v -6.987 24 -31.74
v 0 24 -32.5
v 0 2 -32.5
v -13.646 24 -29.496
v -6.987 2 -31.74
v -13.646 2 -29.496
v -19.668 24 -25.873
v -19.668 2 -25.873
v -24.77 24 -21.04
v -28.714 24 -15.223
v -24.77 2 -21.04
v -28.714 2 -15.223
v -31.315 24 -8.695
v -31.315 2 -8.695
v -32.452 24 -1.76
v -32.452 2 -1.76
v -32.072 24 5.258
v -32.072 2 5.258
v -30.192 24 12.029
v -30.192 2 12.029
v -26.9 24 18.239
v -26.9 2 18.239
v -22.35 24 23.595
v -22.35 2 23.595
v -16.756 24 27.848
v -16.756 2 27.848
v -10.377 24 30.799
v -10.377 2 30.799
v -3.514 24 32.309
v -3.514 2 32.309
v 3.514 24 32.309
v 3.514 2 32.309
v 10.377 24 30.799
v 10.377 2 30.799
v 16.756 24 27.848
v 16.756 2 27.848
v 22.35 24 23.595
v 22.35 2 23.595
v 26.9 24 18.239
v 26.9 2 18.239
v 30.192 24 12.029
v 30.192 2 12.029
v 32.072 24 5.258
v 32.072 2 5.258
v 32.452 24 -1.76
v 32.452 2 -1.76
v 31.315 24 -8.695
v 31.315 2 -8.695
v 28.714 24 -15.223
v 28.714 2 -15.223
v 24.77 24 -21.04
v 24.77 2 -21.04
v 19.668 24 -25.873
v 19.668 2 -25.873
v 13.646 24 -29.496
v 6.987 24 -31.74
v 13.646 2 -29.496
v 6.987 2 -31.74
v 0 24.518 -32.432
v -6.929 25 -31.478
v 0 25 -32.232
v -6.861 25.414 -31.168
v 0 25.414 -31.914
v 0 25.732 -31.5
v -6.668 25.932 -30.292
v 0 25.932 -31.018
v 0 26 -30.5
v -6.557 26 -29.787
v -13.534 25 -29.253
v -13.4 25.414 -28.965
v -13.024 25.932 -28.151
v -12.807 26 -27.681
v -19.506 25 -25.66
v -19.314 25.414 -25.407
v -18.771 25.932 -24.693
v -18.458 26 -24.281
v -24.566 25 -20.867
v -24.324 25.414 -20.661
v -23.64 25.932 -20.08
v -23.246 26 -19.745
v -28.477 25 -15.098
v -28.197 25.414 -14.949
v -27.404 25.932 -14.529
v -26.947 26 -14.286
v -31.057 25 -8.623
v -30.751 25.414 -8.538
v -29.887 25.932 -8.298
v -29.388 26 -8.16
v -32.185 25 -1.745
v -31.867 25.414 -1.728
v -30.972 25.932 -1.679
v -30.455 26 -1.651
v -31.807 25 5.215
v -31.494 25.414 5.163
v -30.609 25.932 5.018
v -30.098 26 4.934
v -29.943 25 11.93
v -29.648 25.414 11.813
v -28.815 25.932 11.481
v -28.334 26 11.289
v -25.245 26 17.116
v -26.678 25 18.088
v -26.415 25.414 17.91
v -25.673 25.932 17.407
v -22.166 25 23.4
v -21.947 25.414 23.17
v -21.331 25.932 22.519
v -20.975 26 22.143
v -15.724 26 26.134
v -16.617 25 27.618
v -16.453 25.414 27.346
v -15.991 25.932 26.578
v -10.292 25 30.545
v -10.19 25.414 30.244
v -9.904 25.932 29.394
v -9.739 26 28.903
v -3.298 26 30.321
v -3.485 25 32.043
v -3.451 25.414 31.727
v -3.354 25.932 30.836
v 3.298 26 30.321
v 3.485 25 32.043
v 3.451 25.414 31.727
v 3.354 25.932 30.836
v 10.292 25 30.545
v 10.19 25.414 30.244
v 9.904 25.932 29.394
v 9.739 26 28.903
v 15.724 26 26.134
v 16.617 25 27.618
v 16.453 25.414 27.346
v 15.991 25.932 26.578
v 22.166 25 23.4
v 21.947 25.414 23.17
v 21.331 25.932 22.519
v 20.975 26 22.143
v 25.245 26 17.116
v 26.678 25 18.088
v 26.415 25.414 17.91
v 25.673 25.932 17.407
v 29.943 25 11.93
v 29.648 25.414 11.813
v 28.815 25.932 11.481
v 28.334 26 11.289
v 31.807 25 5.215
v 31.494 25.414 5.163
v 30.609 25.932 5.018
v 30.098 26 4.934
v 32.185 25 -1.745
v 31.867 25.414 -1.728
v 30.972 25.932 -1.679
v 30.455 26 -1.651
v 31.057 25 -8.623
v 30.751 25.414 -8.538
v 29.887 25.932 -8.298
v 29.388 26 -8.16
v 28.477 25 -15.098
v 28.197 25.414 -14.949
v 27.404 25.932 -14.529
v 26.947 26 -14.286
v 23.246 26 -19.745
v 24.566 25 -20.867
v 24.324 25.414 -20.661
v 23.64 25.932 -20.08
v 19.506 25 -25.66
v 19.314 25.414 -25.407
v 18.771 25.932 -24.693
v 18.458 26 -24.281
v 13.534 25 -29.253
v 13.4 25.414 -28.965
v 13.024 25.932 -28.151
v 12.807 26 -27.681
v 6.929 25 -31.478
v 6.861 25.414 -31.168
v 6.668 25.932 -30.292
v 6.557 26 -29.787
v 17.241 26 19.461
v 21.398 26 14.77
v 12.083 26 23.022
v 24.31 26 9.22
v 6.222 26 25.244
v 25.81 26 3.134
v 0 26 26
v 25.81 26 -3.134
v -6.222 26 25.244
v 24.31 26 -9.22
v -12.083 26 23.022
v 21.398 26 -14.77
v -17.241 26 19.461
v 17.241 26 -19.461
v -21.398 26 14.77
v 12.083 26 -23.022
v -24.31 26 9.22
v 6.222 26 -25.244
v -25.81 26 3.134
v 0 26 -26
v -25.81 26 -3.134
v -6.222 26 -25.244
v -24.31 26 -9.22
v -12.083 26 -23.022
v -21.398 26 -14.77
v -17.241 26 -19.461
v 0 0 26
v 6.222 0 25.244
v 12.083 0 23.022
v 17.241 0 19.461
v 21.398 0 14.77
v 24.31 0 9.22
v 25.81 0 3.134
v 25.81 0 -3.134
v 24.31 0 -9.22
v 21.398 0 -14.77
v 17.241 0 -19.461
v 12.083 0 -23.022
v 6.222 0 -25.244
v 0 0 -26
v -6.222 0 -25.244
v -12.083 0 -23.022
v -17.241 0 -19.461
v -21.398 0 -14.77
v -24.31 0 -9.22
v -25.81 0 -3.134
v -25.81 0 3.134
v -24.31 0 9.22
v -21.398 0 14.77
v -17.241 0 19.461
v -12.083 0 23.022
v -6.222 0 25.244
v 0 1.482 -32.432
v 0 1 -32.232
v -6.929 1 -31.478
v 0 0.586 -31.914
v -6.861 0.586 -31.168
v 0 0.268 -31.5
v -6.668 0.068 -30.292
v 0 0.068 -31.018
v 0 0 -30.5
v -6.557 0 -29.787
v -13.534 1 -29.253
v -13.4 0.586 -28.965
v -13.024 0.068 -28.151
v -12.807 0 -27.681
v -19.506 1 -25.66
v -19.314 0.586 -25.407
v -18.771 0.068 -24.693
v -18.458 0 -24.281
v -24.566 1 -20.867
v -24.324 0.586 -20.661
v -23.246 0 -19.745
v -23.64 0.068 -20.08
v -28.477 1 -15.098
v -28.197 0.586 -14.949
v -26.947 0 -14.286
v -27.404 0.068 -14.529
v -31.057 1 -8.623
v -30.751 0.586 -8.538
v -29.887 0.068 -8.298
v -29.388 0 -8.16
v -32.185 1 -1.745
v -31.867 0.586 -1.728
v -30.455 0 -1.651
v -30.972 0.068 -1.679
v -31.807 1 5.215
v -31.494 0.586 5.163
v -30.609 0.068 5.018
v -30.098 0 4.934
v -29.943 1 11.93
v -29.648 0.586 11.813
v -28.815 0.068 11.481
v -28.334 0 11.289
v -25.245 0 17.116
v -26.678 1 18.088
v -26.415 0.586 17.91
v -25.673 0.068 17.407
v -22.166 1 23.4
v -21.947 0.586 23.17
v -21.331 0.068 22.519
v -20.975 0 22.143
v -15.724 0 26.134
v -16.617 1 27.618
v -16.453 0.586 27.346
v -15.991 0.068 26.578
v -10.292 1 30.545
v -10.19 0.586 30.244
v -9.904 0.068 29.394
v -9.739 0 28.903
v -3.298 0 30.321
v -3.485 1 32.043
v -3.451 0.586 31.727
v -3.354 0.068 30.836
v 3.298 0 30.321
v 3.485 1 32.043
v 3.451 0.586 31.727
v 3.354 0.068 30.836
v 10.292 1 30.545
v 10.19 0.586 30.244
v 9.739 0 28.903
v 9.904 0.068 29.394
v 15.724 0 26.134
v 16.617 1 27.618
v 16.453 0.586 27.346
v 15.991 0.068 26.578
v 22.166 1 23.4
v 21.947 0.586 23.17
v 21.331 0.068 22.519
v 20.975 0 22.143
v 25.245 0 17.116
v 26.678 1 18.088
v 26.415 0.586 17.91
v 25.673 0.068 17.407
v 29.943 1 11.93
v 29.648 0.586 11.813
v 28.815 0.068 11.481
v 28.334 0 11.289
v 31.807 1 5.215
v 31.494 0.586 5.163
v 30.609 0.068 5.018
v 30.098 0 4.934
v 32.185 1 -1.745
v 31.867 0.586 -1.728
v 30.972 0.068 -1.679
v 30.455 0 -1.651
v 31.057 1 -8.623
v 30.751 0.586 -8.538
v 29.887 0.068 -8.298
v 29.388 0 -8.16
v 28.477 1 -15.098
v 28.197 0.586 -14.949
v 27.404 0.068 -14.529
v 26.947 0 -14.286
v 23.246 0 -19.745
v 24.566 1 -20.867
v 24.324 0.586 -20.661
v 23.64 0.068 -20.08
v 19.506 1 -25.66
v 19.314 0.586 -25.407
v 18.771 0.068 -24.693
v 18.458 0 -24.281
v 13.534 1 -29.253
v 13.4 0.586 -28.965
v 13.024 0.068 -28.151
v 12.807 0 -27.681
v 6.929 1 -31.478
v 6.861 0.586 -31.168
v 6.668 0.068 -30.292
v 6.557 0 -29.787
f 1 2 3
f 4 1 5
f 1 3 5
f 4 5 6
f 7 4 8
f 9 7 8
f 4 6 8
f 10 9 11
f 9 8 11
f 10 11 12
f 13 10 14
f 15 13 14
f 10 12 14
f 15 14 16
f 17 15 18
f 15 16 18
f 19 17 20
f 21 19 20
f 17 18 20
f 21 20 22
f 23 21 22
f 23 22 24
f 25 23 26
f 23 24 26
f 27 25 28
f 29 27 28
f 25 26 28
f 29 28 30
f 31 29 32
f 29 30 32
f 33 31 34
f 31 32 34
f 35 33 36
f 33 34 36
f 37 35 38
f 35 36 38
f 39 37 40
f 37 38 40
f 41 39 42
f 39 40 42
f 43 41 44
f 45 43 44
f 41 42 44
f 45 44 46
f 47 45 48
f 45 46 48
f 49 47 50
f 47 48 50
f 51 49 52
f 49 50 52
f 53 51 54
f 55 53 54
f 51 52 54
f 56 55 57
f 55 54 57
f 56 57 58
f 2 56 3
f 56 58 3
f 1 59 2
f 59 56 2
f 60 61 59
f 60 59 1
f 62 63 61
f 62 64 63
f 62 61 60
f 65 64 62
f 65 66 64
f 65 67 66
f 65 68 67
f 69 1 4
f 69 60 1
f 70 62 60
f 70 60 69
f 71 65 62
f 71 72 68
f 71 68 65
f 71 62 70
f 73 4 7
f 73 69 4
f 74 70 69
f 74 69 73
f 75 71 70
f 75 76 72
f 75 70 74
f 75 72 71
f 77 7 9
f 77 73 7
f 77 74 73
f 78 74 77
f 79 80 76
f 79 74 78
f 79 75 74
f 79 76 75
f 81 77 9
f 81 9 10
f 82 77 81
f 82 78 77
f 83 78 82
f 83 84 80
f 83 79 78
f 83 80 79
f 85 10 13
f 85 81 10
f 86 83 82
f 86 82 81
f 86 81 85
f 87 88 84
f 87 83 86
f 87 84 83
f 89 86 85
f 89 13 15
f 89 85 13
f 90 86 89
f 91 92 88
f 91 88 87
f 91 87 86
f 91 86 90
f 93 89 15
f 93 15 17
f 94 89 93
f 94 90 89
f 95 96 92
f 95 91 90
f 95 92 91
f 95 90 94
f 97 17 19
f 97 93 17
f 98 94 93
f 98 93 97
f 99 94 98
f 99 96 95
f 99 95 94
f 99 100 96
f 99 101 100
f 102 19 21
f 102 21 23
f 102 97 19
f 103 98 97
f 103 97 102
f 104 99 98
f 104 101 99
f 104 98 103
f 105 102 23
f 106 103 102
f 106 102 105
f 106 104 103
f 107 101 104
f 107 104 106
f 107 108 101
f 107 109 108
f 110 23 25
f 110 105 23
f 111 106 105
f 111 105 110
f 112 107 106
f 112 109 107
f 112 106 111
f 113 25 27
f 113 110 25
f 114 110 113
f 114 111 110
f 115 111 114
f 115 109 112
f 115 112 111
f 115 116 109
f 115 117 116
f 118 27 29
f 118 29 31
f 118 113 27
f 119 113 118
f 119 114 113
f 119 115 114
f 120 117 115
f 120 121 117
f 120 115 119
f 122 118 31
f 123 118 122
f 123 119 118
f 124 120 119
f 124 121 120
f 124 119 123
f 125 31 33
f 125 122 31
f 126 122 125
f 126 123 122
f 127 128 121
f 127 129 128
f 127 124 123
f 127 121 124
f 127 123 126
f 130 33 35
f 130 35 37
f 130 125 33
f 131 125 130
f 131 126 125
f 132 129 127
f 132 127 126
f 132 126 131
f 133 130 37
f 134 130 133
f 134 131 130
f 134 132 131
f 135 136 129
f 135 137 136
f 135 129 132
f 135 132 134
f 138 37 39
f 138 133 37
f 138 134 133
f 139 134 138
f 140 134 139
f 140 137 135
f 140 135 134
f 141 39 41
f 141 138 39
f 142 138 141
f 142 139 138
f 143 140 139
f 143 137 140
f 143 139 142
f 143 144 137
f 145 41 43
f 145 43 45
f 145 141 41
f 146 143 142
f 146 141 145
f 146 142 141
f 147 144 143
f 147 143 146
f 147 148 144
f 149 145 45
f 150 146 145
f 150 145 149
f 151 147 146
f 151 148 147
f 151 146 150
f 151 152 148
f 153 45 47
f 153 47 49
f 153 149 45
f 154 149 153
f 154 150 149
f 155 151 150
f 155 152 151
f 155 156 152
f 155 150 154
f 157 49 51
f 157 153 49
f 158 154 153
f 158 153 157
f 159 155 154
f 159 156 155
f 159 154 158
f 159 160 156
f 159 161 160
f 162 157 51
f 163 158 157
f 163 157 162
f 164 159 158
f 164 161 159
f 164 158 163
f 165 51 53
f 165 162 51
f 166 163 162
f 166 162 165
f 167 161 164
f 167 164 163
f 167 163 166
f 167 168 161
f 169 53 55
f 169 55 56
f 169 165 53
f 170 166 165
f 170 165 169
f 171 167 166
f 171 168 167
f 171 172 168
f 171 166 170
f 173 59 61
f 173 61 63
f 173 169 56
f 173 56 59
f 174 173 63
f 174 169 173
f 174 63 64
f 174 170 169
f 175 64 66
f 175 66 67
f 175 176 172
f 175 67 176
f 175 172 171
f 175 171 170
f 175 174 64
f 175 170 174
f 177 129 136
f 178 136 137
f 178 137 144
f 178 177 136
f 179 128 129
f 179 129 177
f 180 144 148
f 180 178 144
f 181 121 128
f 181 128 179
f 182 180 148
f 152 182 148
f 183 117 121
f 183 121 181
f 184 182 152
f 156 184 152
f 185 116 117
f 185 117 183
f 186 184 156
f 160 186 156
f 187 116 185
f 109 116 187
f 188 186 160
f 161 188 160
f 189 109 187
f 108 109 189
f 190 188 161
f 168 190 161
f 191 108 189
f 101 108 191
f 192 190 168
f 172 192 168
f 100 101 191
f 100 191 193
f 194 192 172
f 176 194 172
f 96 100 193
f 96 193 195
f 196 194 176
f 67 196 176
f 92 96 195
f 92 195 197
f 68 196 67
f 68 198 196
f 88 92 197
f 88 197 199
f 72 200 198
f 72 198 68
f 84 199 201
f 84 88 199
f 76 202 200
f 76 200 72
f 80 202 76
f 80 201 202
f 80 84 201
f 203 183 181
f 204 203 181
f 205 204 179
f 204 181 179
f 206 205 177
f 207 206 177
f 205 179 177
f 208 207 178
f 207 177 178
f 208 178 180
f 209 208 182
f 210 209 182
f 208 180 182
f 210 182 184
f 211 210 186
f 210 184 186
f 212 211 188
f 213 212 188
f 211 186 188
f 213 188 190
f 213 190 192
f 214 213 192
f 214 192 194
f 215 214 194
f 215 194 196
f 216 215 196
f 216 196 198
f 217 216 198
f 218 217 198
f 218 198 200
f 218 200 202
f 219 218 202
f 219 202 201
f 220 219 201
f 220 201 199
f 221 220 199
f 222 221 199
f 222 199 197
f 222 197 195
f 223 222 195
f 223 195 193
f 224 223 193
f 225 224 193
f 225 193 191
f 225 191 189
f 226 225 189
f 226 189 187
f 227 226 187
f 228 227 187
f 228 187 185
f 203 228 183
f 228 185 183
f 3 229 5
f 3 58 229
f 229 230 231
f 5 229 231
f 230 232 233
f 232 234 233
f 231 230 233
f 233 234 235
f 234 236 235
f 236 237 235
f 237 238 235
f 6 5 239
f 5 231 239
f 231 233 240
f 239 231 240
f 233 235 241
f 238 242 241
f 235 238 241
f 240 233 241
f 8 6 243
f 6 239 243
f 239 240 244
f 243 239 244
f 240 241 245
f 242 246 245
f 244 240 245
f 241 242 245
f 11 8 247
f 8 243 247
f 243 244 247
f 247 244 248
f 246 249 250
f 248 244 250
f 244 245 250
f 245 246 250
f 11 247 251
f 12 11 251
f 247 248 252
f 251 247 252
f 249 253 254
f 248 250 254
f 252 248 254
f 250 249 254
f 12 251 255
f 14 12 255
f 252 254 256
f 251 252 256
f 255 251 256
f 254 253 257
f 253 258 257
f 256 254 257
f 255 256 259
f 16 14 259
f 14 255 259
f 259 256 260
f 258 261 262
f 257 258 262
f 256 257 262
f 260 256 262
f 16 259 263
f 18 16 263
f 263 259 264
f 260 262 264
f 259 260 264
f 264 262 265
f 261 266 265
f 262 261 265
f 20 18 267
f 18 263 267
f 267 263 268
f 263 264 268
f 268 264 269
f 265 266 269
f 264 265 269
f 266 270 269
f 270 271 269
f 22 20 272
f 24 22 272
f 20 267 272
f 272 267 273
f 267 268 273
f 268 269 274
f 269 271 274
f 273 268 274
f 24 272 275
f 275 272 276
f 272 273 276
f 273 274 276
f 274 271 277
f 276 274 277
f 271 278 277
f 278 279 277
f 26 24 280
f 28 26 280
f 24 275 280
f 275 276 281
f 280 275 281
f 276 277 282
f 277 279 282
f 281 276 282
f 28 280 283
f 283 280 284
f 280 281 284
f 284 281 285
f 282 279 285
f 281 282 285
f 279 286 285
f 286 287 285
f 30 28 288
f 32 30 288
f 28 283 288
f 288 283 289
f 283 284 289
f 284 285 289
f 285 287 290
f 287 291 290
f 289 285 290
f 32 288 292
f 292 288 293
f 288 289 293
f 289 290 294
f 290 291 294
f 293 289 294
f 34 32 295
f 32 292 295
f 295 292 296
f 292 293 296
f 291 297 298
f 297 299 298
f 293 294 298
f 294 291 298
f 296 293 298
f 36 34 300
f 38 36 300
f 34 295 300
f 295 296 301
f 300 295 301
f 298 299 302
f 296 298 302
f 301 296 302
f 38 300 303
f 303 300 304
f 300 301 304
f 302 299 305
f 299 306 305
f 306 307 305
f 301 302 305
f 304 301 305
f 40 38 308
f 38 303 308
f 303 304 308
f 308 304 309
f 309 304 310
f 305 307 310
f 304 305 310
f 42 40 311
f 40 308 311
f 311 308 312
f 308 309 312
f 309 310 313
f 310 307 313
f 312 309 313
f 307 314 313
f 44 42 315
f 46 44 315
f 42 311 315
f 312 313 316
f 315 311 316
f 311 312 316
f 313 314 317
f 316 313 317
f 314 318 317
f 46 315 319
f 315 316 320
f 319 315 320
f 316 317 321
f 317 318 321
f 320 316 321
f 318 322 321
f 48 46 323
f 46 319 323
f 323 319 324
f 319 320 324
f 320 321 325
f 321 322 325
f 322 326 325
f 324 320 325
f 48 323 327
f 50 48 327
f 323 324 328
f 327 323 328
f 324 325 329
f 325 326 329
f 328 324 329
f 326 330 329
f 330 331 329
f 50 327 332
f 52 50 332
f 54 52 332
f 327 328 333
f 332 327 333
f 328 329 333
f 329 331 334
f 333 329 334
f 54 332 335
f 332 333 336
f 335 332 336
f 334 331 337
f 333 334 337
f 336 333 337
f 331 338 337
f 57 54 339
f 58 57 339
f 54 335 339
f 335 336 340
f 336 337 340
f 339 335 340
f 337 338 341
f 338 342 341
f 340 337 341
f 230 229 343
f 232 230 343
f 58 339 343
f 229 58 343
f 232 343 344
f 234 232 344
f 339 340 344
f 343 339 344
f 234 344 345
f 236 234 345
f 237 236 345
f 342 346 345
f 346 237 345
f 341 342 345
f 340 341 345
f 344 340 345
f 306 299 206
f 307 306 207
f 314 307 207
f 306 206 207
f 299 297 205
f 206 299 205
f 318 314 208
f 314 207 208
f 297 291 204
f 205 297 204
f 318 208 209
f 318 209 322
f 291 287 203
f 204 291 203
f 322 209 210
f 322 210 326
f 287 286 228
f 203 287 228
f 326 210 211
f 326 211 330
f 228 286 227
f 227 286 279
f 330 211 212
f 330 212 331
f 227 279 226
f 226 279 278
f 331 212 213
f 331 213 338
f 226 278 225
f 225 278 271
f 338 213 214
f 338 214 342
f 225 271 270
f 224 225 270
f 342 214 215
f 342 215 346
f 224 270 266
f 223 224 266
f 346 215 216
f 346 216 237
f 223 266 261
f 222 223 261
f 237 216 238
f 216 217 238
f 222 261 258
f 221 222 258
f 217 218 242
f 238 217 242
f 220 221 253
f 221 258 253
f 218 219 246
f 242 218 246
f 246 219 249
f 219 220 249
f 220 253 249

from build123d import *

# Parameters (mm, degrees)
SKETCH_1_R          = 32.5
EXTRUDE_1_DEPTH     = 26
SKETCH_3_R          = 26
CUT_EXTRUDE_1_DEPTH = 53.80624963
FILLET_1_R          = 2


with BuildPart() as part:
    # 草图1 → 凸台-拉伸1 (new body)
    with BuildSketch(Plane(origin=(0, 0, 0), x_dir=(1, 0, 0), z_dir=(0, 1, 0))):
        with Locations(Location((0, 0, 0), (0, 0, 90))):
            Circle(SKETCH_1_R)
    extrude(amount=EXTRUDE_1_DEPTH)

    # 草图3 → 切除-拉伸1 (cut, through all)
    with BuildSketch(Plane(origin=(0, 26, 0), x_dir=(1, 0, 0), z_dir=(0, 1, 0))):
        with Locations(Location((0, 0, 0), (0, 0, 270))):
            Circle(SKETCH_3_R)
    extrude(amount=-CUT_EXTRUDE_1_DEPTH, mode=Mode.SUBTRACT)

    # 圆角1
    fillet_1_edges = [part.edges().sort_by_distance(p)[0] for p in [
        (0, 0, 32.5),
        (0, 26, 32.5),
    ]]
    fillet(fillet_1_edges, radius=FILLET_1_R)


solid = part.part
